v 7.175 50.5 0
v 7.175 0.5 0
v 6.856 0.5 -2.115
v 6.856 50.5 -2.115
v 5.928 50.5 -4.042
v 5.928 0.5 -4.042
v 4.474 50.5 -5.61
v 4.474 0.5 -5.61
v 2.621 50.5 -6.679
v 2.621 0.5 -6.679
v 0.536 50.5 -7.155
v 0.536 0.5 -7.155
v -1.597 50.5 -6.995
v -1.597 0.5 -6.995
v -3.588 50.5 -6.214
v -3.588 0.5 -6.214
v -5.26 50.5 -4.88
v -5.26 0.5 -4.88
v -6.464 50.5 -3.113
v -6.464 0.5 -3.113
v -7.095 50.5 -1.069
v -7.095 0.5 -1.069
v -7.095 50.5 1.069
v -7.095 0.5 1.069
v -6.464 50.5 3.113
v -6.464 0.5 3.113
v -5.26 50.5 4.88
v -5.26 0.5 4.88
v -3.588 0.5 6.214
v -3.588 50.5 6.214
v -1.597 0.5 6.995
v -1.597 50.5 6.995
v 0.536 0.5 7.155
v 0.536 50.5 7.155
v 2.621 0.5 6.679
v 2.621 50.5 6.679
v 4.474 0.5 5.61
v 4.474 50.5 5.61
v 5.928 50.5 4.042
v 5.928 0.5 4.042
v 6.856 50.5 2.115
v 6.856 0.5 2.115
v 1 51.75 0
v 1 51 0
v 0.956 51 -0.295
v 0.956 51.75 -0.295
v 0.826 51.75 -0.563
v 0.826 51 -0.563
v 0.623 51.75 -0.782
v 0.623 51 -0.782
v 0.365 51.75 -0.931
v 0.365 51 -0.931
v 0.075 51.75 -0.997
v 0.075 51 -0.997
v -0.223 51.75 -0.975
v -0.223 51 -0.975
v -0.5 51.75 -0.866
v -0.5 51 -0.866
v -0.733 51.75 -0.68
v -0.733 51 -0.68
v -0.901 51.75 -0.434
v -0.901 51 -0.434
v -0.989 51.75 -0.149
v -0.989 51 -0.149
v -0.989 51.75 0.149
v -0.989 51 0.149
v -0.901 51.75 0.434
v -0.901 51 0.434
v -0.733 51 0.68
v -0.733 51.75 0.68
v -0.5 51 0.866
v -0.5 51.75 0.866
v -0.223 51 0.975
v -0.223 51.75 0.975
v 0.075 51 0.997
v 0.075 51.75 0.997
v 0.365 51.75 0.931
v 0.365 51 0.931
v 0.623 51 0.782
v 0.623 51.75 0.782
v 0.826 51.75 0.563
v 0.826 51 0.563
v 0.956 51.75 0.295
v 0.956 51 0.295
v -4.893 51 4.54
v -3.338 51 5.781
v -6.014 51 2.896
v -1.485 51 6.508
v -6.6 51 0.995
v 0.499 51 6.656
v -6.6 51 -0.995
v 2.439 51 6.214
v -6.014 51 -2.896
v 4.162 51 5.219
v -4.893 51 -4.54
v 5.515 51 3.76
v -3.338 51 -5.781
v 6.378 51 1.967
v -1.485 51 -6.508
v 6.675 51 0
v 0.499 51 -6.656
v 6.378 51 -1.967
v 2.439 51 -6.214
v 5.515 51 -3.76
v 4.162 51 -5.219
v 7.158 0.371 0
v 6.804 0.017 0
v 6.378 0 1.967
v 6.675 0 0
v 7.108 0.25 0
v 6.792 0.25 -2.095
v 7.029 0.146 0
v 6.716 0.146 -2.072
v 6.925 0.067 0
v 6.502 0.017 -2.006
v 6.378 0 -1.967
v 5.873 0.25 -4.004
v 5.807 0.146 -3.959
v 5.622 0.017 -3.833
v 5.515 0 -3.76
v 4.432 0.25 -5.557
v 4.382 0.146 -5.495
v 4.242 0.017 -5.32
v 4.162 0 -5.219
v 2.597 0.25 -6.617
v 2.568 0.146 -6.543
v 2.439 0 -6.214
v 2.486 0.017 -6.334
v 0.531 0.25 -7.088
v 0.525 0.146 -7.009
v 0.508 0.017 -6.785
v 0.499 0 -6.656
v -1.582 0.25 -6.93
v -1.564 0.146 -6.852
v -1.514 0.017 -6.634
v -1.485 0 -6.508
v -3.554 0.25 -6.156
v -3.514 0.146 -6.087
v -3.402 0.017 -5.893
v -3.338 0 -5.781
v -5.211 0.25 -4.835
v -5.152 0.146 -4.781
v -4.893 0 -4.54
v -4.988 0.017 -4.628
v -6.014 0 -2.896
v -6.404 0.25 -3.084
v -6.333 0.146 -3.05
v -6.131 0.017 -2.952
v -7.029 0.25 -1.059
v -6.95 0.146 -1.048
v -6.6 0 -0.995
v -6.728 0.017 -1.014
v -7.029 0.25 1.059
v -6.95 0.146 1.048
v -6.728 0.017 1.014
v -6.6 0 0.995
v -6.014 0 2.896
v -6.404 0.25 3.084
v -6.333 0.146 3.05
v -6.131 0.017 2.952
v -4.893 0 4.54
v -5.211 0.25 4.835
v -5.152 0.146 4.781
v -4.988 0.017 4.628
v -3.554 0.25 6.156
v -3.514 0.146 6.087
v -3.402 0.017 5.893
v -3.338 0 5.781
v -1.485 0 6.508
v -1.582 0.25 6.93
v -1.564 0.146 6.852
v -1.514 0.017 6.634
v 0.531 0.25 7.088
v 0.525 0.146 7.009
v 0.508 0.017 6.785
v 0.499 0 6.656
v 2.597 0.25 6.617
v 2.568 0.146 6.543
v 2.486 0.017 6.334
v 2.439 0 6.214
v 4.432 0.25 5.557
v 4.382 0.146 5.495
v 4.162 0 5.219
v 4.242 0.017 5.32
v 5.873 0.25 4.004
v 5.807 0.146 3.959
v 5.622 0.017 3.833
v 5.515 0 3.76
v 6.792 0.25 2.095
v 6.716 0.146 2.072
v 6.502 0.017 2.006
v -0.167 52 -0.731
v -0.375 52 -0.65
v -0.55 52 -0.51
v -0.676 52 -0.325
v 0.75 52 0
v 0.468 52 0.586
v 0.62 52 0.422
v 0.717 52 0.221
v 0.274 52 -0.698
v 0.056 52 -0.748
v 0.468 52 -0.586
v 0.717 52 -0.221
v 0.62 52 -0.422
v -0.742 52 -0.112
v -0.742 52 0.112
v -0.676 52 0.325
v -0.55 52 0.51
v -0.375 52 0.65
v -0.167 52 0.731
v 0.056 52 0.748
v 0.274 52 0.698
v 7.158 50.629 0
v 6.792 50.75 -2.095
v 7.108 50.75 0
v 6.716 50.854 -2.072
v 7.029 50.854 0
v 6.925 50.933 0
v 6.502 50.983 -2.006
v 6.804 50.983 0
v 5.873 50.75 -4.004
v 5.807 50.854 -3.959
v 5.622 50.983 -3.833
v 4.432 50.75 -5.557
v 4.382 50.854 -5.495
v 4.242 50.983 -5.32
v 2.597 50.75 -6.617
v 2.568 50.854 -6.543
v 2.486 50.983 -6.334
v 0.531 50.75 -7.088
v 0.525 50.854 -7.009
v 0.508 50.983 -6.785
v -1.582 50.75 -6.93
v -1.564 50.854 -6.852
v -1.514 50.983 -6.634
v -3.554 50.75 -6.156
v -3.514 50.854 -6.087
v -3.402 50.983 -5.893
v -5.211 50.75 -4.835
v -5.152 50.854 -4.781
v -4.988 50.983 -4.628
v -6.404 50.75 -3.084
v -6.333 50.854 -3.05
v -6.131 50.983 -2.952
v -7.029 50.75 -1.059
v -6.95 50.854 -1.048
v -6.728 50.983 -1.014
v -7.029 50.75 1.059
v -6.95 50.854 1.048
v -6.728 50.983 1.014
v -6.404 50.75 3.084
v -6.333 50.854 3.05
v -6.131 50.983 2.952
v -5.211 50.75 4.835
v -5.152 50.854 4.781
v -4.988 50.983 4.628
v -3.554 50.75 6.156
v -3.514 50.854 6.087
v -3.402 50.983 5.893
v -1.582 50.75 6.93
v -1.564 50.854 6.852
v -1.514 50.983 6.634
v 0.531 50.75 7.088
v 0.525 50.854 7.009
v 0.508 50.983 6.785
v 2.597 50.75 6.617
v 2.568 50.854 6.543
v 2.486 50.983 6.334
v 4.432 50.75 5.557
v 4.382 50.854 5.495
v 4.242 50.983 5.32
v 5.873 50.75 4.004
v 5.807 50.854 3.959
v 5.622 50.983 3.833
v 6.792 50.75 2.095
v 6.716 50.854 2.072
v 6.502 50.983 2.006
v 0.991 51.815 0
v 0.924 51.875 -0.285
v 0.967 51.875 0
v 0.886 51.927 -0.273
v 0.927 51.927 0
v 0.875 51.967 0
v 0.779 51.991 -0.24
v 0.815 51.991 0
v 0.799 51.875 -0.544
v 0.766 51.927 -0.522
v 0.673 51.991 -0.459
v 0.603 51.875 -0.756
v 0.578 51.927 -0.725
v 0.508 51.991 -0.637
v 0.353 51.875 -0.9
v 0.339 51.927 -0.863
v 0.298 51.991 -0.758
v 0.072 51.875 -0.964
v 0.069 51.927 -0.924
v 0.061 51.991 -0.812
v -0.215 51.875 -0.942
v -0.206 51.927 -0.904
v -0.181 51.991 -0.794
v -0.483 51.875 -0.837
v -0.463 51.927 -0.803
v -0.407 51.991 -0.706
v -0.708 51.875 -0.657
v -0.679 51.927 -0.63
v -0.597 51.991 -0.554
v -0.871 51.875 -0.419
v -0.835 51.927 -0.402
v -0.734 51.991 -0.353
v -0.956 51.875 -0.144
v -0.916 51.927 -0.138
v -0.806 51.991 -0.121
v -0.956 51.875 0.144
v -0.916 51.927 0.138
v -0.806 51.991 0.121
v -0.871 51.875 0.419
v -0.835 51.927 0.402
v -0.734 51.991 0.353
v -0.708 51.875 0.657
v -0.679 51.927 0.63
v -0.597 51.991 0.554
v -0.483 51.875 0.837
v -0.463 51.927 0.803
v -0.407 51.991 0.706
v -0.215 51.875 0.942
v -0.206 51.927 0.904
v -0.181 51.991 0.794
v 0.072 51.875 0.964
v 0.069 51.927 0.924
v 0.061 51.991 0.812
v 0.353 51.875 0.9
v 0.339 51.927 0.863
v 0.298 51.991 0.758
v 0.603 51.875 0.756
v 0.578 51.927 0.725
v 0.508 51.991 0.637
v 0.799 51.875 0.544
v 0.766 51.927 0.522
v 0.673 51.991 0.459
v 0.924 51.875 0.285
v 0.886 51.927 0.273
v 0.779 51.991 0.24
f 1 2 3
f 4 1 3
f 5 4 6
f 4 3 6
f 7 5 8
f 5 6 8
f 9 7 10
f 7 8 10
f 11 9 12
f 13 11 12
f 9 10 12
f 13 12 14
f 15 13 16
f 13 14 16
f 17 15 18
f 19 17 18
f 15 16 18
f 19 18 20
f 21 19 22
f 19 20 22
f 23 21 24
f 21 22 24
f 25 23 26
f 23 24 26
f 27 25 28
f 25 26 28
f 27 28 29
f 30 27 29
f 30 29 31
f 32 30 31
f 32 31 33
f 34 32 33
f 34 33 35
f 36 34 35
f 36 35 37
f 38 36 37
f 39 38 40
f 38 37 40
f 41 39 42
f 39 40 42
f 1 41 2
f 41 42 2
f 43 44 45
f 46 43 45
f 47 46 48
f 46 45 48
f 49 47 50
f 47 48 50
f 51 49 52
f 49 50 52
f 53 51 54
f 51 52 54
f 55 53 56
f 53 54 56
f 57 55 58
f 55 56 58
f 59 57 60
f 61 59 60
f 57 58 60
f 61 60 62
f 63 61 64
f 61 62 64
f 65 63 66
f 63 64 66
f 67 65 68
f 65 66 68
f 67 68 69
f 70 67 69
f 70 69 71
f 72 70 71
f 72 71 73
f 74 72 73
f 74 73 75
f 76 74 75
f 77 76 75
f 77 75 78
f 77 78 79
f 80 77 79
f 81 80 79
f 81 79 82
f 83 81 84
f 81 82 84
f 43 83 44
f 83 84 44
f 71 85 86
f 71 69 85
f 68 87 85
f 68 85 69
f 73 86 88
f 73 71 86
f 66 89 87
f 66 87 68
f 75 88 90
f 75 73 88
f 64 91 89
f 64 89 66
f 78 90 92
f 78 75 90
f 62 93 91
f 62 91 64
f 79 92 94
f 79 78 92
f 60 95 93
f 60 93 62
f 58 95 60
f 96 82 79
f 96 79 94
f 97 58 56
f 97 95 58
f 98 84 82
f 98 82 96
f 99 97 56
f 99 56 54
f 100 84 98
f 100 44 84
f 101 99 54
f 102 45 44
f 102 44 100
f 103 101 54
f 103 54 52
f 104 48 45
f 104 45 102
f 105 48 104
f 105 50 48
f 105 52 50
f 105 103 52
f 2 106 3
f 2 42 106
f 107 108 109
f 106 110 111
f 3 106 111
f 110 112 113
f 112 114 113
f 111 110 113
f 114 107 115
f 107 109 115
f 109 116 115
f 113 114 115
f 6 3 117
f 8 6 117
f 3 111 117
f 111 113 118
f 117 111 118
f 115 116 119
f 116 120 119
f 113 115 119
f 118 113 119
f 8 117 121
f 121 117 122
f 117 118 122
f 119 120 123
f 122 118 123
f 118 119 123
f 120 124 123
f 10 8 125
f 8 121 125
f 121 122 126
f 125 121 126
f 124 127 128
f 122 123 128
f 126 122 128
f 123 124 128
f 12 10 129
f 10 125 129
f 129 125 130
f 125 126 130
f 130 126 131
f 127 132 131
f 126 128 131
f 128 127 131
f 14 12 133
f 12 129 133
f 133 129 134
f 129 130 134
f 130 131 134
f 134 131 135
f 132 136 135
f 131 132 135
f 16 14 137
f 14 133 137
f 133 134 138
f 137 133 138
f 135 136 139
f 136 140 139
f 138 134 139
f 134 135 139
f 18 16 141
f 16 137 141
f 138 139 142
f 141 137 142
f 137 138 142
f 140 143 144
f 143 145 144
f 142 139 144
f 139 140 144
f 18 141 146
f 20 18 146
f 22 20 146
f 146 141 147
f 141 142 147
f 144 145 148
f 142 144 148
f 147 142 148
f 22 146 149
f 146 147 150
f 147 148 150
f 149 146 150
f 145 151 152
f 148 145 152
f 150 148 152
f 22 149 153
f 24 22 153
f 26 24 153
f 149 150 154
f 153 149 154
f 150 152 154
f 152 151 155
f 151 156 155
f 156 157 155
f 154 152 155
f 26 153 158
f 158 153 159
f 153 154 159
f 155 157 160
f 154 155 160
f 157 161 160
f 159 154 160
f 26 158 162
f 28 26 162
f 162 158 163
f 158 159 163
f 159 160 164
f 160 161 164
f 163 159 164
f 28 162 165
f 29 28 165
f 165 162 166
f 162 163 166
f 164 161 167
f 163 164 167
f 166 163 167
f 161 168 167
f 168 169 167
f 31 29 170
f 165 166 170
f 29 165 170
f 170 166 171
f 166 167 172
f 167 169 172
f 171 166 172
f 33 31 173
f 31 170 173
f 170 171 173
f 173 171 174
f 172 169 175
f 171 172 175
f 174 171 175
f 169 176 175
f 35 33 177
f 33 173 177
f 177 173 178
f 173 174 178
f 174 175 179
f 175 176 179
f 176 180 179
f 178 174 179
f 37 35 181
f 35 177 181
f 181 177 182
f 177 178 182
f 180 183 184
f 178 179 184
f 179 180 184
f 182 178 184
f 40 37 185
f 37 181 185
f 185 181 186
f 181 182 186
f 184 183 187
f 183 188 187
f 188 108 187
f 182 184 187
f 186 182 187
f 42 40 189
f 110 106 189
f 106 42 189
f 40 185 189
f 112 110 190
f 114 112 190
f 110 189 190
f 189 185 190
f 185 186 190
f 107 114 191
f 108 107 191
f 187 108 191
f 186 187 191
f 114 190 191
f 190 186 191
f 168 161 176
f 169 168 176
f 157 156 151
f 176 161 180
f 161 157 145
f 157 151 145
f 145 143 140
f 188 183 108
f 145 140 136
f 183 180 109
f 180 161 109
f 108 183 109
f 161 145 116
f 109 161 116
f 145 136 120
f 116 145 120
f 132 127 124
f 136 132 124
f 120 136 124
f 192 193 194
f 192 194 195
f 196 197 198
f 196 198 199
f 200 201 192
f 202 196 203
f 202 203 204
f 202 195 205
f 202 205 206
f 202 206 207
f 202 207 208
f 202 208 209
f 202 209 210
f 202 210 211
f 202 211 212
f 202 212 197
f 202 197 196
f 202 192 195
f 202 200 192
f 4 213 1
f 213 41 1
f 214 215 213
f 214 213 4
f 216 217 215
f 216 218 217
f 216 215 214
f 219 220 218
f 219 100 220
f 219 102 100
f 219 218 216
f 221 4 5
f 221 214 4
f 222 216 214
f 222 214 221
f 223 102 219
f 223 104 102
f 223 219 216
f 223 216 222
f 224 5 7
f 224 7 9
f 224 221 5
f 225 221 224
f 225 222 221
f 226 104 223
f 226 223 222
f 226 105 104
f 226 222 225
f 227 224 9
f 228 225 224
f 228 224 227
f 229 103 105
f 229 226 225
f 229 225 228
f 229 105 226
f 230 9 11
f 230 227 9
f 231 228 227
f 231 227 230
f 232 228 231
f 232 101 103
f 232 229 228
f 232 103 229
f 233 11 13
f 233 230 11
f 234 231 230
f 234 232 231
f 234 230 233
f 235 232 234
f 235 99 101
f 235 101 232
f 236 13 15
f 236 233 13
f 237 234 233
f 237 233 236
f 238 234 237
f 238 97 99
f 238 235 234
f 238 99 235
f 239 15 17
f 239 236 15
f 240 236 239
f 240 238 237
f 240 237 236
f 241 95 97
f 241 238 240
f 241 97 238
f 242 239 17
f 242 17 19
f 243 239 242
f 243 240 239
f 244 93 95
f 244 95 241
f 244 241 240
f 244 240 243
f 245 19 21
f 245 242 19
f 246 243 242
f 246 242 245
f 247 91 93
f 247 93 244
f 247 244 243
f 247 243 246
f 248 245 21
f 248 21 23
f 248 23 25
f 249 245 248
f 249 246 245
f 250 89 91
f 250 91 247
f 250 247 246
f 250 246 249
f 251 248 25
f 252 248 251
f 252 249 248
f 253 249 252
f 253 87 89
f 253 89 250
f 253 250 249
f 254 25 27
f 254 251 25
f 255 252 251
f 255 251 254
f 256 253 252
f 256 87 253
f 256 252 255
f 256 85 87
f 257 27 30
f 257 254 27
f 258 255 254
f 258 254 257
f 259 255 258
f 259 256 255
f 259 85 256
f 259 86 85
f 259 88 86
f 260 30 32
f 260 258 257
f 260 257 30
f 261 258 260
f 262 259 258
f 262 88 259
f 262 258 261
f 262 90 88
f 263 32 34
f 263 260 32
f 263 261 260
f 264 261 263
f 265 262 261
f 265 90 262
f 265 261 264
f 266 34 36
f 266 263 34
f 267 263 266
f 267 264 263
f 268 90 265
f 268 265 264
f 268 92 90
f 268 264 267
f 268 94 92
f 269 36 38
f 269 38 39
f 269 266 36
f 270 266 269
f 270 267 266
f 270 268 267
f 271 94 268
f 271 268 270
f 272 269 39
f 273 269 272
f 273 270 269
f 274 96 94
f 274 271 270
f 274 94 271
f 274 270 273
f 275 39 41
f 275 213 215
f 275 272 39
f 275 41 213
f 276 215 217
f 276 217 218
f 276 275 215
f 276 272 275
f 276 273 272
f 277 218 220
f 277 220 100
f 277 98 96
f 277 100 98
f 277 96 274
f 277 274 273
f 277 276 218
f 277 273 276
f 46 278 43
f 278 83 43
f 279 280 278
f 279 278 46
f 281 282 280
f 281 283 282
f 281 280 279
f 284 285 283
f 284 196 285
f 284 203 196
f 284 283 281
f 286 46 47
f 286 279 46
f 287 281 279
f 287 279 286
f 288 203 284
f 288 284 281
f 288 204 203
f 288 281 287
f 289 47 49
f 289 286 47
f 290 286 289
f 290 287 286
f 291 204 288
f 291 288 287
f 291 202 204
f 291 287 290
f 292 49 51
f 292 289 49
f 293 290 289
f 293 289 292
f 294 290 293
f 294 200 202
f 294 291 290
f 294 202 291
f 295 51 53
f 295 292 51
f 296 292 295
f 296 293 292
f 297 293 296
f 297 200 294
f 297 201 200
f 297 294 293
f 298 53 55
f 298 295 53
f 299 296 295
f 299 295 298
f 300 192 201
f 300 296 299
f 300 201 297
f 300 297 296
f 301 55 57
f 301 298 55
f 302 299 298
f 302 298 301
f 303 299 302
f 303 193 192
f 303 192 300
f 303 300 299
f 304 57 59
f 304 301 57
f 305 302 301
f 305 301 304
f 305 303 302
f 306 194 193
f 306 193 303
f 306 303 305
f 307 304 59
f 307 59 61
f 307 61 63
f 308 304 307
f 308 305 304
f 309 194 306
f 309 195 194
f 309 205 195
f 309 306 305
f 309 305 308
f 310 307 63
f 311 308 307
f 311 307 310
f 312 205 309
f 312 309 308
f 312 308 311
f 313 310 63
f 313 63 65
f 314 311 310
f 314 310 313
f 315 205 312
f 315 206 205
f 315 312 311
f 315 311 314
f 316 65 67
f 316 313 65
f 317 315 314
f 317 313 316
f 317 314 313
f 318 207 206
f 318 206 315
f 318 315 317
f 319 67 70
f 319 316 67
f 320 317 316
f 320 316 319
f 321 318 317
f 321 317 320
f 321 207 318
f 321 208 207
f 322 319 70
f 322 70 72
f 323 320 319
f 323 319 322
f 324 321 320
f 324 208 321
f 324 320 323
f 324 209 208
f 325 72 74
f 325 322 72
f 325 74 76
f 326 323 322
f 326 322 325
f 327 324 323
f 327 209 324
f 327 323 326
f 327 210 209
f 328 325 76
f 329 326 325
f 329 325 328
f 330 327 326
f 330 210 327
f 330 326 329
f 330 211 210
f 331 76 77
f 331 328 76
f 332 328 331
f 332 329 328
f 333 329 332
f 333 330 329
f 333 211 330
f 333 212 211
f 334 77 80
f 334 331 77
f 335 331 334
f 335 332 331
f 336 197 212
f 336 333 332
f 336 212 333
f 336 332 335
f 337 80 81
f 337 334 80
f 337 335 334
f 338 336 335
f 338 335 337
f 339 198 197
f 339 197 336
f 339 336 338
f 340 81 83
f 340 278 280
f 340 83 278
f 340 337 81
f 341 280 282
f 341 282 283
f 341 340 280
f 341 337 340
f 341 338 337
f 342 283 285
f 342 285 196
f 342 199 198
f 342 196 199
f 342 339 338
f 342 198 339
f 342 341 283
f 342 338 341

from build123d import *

# Parameters (mm, degrees)
SKETCH1_R           = 7.175
BOSS_EXTRUDE1_DEPTH = 51
FILLET1_R           = 0.5
SKETCH2_R           = 1
BOSS_EXTRUDE2_DEPTH = 1
FILLET2_R           = 0.25


with BuildPart() as part:
    # Sketch1 → Boss-Extrude1 (new body)
    with BuildSketch(Plane(origin=(0, 0, 0), x_dir=(1, 0, 0), z_dir=(0, 1, 0))):
        Circle(SKETCH1_R)
    extrude(amount=BOSS_EXTRUDE1_DEPTH)

    # Fillet1
    fillet1_edges = [part.edges().sort_by_distance(p)[0] for p in [
        (-7.175, 0, 0),
        (-7.175, 51, 0),
    ]]
    fillet(fillet1_edges, radius=FILLET1_R)

    # Sketch2 → Boss-Extrude2 (add)
    with BuildSketch(Plane(origin=(0, 51, 0), x_dir=(1, 0, 0), z_dir=(0, 1, 0))):
        Circle(SKETCH2_R)
    extrude(amount=BOSS_EXTRUDE2_DEPTH)

    # Fillet2
    fillet2_edges = [part.edges().sort_by_distance(p)[0] for p in [
        (-1, 52, 0),
    ]]
    fillet(fillet2_edges, radius=FILLET2_R)


solid = part.part
